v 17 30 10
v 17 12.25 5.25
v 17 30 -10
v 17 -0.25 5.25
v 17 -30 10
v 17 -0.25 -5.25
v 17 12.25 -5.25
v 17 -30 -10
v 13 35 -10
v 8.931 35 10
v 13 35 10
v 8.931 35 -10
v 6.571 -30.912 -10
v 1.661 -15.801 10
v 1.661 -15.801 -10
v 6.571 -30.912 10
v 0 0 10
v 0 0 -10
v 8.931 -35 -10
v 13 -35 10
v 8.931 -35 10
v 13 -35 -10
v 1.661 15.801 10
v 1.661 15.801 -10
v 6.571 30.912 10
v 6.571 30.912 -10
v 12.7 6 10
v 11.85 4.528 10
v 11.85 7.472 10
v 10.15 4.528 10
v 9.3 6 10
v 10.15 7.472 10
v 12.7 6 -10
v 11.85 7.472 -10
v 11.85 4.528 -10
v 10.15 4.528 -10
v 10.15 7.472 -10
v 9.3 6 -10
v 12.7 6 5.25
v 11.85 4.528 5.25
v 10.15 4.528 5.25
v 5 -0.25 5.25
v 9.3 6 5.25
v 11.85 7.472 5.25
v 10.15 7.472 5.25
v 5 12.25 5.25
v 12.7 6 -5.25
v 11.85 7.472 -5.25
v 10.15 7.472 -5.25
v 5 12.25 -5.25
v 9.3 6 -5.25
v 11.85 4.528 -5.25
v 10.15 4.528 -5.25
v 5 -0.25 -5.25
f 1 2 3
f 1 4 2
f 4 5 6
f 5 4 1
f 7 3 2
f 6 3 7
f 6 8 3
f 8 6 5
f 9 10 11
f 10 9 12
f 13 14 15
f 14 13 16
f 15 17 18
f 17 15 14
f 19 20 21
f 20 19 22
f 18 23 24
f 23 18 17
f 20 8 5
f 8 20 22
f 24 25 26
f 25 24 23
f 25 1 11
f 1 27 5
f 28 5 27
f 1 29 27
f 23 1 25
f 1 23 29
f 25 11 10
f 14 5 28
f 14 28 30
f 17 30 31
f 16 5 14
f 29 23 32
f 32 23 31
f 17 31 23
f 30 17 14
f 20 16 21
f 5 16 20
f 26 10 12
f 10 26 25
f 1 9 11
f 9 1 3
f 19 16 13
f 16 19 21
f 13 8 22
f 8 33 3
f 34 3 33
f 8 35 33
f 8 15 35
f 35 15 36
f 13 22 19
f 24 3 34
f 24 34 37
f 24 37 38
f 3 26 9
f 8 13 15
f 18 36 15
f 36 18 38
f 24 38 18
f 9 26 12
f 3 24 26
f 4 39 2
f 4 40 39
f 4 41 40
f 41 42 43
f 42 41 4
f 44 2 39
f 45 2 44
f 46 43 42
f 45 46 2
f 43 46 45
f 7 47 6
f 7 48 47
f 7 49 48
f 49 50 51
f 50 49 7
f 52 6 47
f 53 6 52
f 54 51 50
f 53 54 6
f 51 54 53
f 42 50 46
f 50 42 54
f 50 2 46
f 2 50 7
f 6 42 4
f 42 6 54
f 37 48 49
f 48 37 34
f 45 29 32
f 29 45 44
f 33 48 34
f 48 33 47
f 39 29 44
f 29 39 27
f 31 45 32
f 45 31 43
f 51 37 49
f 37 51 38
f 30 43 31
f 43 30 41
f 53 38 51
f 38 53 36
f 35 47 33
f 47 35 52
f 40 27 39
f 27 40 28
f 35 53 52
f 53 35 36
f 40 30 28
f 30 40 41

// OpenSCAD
module horseHead(){
    
    W = 11; // Ancho (X) 
    R = 65+W; // Radio de rotacion

    L = 70; // Largo (Y)
    H = 20; // Espesor de la pieza (Z)
    a = 6; // Cateto base
    b = 5; // Cateto altura
    d = 1; // Espesor de la ranura

    // Acople al brazo
    a1 = 12.5; // Ancho del cuadrante (Y)
    b1 = 10.5; // Largo del cuadrante (Z)
    r2 = 1.7; // Radio del tornillo de ajuste

    // Desplazamiento del acople
    delta = 6;

    // Poligono de interseccion
    poly = [[0,-L/2],
            [W+2,-L/2],
            [W+a,b-L/2],
            [W+a,L/2-b],
            [W+2,L/2],
            [0,L/2]];
            
     difference(){
        linear_extrude(height = H, center = true)
            intersection(){
                translate([R,0,0])
                    circle(R);
                translate([0,0,0])
                    polygon( points=poly );
            }
        
        // Acople al brazo
        translate([(W+a)/2+5,delta,0])
            cube([W+a,a1,b1], center = true);
        translate([W,delta,0])
            cylinder(r = r2, h = H, center = true);
    }
}

//$fn = 250;
horseHead();
